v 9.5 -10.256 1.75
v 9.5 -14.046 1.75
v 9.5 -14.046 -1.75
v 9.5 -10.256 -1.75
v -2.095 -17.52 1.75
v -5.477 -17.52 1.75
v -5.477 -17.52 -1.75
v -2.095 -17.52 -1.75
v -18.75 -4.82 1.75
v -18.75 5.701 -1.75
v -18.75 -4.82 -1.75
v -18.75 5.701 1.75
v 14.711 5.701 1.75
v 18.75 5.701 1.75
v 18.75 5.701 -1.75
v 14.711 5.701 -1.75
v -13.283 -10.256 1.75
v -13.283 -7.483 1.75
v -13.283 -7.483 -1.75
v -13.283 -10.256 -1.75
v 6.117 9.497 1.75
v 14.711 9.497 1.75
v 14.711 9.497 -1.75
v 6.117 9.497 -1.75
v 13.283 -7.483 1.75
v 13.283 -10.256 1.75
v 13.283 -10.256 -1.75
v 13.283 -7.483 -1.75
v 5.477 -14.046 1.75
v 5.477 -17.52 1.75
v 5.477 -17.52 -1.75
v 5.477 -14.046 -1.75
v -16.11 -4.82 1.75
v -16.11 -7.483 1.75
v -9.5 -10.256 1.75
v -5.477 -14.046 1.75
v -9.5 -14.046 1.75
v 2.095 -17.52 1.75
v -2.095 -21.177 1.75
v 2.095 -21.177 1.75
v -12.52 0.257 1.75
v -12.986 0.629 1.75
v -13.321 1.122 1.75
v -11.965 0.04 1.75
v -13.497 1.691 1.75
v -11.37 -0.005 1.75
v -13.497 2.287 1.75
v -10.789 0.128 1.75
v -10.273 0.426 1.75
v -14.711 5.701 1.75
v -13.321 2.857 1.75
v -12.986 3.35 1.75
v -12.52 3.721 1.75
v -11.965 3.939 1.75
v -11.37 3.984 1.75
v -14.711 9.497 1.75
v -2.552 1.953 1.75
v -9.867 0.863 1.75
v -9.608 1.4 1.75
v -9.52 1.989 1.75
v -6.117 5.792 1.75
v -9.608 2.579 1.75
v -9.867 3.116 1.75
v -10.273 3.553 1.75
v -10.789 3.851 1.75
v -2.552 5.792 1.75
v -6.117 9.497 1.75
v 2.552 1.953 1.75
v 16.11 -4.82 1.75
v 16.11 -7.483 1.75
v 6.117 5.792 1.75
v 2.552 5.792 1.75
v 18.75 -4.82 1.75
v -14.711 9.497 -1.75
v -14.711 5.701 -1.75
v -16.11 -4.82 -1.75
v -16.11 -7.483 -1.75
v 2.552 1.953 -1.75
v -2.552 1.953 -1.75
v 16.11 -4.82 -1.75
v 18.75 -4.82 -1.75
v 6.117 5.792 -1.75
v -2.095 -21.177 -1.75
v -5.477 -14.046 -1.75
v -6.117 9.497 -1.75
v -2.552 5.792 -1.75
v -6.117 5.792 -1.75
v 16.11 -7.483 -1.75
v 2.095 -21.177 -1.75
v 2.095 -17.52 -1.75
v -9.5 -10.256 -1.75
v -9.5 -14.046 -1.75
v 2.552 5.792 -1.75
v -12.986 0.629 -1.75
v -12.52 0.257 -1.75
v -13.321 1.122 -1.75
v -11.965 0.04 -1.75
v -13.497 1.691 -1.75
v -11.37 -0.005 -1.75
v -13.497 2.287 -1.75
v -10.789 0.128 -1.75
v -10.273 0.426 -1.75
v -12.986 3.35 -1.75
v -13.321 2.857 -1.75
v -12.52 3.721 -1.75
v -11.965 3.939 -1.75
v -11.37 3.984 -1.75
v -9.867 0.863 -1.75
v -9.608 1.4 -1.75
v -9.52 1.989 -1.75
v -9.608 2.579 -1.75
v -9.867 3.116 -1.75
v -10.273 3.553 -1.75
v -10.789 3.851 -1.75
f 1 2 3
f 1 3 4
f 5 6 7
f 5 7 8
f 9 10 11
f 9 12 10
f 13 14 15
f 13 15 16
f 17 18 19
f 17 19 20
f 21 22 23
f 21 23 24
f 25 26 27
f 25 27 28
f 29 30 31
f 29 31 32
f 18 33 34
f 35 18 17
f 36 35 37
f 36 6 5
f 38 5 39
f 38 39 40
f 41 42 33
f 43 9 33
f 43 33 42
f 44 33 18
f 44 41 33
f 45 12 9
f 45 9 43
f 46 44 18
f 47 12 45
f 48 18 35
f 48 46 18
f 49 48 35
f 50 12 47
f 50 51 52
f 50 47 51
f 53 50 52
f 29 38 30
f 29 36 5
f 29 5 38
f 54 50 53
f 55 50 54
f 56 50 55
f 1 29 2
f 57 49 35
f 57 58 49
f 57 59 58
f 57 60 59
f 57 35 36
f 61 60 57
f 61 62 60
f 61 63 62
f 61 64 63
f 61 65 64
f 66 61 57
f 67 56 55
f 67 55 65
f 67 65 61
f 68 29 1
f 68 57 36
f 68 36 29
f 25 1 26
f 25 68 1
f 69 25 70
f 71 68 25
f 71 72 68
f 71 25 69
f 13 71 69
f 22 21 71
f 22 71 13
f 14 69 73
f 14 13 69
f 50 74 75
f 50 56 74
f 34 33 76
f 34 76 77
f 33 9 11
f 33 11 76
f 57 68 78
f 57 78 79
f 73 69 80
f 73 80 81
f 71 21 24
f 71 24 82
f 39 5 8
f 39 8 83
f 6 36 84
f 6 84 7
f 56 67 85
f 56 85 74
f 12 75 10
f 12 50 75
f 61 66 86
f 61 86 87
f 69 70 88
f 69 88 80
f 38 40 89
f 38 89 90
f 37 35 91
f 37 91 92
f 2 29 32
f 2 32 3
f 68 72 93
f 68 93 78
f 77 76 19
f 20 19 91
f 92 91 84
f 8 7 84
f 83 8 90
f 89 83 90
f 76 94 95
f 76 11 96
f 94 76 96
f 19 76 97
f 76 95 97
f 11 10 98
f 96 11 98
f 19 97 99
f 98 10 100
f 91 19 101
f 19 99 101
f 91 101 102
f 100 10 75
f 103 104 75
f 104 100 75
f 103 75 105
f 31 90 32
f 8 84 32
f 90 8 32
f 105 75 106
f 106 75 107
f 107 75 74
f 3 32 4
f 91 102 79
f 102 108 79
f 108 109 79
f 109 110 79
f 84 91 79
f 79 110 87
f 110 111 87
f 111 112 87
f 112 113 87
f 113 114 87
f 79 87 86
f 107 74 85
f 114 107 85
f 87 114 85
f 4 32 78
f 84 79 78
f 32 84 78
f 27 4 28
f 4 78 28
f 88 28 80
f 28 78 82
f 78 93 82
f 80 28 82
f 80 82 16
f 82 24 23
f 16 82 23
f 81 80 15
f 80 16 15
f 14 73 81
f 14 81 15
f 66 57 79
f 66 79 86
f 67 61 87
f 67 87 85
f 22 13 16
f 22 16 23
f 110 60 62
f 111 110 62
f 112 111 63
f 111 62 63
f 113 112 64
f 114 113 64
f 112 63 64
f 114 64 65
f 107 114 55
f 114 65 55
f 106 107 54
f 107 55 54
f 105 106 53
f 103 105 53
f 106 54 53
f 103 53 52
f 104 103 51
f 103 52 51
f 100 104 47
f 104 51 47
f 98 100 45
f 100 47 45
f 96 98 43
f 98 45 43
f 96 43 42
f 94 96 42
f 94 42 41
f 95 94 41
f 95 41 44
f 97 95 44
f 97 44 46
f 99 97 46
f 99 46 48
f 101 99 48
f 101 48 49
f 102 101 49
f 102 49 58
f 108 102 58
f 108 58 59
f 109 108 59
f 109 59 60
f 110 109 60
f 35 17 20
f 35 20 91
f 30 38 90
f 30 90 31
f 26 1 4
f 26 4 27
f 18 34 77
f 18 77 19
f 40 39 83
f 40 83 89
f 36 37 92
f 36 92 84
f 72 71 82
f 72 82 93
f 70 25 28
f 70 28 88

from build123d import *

# Parameters (mm, degrees)
F2_DEPTH = 1.75
F3_R     = 2
F4_DEPTH = 3.501


with BuildPart() as f2:
    # F1 (on Top) → F2 (new body, symmetric)
    with BuildSketch(Plane.XY):
        Polygon((-18.75, 5.700945), (-18.75, 0), (-18.75, -4.819782), (-16.109731, -4.819782), (-16.109731, -7.483373), (-13.283064, -7.483373), (-13.283064, -10.255682), (-9.499629, -10.255682), (-9.499629, -14.045903), (-5.477123, -14.045903), (-5.477123, -17.519886), (-2.094561, -17.519886), (-2.094561, -21.176709), (0, -21.176709), (2.094561, -21.176709), (2.094561, -17.519886), (5.477123, -17.519886), (5.477123, -14.045903), (9.499629, -14.045903), (9.499629, -10.255682), (13.283064, -10.255682), (13.283064, -7.483373), (16.109731, -7.483373), (16.109731, -4.819782), (18.75, -4.819782), (18.75, 0), (18.75, 5.700945), (14.710603, 5.700945), (14.710603, 9.496642), (6.117067, 9.496642), (6.117067, 5.792365), (2.551664, 5.792365), (2.551664, 1.9527), (0, 1.9527), (-2.551664, 1.9527), (-2.551664, 5.792365), (-6.117067, 5.792365), (-6.117067, 9.496642), (-14.710603, 9.496642), (-14.710603, 5.700945), align=None)
    extrude(amount=F2_DEPTH, both=True)

    # F3 (on face) → F4 (cut, through all)
    with BuildSketch(Plane.XY.offset(1.75)):
        with Locations((-11.519544, 1.989414)):
            Circle(F3_R)
    extrude(amount=-F4_DEPTH, mode=Mode.SUBTRACT)


solid = f2.part
